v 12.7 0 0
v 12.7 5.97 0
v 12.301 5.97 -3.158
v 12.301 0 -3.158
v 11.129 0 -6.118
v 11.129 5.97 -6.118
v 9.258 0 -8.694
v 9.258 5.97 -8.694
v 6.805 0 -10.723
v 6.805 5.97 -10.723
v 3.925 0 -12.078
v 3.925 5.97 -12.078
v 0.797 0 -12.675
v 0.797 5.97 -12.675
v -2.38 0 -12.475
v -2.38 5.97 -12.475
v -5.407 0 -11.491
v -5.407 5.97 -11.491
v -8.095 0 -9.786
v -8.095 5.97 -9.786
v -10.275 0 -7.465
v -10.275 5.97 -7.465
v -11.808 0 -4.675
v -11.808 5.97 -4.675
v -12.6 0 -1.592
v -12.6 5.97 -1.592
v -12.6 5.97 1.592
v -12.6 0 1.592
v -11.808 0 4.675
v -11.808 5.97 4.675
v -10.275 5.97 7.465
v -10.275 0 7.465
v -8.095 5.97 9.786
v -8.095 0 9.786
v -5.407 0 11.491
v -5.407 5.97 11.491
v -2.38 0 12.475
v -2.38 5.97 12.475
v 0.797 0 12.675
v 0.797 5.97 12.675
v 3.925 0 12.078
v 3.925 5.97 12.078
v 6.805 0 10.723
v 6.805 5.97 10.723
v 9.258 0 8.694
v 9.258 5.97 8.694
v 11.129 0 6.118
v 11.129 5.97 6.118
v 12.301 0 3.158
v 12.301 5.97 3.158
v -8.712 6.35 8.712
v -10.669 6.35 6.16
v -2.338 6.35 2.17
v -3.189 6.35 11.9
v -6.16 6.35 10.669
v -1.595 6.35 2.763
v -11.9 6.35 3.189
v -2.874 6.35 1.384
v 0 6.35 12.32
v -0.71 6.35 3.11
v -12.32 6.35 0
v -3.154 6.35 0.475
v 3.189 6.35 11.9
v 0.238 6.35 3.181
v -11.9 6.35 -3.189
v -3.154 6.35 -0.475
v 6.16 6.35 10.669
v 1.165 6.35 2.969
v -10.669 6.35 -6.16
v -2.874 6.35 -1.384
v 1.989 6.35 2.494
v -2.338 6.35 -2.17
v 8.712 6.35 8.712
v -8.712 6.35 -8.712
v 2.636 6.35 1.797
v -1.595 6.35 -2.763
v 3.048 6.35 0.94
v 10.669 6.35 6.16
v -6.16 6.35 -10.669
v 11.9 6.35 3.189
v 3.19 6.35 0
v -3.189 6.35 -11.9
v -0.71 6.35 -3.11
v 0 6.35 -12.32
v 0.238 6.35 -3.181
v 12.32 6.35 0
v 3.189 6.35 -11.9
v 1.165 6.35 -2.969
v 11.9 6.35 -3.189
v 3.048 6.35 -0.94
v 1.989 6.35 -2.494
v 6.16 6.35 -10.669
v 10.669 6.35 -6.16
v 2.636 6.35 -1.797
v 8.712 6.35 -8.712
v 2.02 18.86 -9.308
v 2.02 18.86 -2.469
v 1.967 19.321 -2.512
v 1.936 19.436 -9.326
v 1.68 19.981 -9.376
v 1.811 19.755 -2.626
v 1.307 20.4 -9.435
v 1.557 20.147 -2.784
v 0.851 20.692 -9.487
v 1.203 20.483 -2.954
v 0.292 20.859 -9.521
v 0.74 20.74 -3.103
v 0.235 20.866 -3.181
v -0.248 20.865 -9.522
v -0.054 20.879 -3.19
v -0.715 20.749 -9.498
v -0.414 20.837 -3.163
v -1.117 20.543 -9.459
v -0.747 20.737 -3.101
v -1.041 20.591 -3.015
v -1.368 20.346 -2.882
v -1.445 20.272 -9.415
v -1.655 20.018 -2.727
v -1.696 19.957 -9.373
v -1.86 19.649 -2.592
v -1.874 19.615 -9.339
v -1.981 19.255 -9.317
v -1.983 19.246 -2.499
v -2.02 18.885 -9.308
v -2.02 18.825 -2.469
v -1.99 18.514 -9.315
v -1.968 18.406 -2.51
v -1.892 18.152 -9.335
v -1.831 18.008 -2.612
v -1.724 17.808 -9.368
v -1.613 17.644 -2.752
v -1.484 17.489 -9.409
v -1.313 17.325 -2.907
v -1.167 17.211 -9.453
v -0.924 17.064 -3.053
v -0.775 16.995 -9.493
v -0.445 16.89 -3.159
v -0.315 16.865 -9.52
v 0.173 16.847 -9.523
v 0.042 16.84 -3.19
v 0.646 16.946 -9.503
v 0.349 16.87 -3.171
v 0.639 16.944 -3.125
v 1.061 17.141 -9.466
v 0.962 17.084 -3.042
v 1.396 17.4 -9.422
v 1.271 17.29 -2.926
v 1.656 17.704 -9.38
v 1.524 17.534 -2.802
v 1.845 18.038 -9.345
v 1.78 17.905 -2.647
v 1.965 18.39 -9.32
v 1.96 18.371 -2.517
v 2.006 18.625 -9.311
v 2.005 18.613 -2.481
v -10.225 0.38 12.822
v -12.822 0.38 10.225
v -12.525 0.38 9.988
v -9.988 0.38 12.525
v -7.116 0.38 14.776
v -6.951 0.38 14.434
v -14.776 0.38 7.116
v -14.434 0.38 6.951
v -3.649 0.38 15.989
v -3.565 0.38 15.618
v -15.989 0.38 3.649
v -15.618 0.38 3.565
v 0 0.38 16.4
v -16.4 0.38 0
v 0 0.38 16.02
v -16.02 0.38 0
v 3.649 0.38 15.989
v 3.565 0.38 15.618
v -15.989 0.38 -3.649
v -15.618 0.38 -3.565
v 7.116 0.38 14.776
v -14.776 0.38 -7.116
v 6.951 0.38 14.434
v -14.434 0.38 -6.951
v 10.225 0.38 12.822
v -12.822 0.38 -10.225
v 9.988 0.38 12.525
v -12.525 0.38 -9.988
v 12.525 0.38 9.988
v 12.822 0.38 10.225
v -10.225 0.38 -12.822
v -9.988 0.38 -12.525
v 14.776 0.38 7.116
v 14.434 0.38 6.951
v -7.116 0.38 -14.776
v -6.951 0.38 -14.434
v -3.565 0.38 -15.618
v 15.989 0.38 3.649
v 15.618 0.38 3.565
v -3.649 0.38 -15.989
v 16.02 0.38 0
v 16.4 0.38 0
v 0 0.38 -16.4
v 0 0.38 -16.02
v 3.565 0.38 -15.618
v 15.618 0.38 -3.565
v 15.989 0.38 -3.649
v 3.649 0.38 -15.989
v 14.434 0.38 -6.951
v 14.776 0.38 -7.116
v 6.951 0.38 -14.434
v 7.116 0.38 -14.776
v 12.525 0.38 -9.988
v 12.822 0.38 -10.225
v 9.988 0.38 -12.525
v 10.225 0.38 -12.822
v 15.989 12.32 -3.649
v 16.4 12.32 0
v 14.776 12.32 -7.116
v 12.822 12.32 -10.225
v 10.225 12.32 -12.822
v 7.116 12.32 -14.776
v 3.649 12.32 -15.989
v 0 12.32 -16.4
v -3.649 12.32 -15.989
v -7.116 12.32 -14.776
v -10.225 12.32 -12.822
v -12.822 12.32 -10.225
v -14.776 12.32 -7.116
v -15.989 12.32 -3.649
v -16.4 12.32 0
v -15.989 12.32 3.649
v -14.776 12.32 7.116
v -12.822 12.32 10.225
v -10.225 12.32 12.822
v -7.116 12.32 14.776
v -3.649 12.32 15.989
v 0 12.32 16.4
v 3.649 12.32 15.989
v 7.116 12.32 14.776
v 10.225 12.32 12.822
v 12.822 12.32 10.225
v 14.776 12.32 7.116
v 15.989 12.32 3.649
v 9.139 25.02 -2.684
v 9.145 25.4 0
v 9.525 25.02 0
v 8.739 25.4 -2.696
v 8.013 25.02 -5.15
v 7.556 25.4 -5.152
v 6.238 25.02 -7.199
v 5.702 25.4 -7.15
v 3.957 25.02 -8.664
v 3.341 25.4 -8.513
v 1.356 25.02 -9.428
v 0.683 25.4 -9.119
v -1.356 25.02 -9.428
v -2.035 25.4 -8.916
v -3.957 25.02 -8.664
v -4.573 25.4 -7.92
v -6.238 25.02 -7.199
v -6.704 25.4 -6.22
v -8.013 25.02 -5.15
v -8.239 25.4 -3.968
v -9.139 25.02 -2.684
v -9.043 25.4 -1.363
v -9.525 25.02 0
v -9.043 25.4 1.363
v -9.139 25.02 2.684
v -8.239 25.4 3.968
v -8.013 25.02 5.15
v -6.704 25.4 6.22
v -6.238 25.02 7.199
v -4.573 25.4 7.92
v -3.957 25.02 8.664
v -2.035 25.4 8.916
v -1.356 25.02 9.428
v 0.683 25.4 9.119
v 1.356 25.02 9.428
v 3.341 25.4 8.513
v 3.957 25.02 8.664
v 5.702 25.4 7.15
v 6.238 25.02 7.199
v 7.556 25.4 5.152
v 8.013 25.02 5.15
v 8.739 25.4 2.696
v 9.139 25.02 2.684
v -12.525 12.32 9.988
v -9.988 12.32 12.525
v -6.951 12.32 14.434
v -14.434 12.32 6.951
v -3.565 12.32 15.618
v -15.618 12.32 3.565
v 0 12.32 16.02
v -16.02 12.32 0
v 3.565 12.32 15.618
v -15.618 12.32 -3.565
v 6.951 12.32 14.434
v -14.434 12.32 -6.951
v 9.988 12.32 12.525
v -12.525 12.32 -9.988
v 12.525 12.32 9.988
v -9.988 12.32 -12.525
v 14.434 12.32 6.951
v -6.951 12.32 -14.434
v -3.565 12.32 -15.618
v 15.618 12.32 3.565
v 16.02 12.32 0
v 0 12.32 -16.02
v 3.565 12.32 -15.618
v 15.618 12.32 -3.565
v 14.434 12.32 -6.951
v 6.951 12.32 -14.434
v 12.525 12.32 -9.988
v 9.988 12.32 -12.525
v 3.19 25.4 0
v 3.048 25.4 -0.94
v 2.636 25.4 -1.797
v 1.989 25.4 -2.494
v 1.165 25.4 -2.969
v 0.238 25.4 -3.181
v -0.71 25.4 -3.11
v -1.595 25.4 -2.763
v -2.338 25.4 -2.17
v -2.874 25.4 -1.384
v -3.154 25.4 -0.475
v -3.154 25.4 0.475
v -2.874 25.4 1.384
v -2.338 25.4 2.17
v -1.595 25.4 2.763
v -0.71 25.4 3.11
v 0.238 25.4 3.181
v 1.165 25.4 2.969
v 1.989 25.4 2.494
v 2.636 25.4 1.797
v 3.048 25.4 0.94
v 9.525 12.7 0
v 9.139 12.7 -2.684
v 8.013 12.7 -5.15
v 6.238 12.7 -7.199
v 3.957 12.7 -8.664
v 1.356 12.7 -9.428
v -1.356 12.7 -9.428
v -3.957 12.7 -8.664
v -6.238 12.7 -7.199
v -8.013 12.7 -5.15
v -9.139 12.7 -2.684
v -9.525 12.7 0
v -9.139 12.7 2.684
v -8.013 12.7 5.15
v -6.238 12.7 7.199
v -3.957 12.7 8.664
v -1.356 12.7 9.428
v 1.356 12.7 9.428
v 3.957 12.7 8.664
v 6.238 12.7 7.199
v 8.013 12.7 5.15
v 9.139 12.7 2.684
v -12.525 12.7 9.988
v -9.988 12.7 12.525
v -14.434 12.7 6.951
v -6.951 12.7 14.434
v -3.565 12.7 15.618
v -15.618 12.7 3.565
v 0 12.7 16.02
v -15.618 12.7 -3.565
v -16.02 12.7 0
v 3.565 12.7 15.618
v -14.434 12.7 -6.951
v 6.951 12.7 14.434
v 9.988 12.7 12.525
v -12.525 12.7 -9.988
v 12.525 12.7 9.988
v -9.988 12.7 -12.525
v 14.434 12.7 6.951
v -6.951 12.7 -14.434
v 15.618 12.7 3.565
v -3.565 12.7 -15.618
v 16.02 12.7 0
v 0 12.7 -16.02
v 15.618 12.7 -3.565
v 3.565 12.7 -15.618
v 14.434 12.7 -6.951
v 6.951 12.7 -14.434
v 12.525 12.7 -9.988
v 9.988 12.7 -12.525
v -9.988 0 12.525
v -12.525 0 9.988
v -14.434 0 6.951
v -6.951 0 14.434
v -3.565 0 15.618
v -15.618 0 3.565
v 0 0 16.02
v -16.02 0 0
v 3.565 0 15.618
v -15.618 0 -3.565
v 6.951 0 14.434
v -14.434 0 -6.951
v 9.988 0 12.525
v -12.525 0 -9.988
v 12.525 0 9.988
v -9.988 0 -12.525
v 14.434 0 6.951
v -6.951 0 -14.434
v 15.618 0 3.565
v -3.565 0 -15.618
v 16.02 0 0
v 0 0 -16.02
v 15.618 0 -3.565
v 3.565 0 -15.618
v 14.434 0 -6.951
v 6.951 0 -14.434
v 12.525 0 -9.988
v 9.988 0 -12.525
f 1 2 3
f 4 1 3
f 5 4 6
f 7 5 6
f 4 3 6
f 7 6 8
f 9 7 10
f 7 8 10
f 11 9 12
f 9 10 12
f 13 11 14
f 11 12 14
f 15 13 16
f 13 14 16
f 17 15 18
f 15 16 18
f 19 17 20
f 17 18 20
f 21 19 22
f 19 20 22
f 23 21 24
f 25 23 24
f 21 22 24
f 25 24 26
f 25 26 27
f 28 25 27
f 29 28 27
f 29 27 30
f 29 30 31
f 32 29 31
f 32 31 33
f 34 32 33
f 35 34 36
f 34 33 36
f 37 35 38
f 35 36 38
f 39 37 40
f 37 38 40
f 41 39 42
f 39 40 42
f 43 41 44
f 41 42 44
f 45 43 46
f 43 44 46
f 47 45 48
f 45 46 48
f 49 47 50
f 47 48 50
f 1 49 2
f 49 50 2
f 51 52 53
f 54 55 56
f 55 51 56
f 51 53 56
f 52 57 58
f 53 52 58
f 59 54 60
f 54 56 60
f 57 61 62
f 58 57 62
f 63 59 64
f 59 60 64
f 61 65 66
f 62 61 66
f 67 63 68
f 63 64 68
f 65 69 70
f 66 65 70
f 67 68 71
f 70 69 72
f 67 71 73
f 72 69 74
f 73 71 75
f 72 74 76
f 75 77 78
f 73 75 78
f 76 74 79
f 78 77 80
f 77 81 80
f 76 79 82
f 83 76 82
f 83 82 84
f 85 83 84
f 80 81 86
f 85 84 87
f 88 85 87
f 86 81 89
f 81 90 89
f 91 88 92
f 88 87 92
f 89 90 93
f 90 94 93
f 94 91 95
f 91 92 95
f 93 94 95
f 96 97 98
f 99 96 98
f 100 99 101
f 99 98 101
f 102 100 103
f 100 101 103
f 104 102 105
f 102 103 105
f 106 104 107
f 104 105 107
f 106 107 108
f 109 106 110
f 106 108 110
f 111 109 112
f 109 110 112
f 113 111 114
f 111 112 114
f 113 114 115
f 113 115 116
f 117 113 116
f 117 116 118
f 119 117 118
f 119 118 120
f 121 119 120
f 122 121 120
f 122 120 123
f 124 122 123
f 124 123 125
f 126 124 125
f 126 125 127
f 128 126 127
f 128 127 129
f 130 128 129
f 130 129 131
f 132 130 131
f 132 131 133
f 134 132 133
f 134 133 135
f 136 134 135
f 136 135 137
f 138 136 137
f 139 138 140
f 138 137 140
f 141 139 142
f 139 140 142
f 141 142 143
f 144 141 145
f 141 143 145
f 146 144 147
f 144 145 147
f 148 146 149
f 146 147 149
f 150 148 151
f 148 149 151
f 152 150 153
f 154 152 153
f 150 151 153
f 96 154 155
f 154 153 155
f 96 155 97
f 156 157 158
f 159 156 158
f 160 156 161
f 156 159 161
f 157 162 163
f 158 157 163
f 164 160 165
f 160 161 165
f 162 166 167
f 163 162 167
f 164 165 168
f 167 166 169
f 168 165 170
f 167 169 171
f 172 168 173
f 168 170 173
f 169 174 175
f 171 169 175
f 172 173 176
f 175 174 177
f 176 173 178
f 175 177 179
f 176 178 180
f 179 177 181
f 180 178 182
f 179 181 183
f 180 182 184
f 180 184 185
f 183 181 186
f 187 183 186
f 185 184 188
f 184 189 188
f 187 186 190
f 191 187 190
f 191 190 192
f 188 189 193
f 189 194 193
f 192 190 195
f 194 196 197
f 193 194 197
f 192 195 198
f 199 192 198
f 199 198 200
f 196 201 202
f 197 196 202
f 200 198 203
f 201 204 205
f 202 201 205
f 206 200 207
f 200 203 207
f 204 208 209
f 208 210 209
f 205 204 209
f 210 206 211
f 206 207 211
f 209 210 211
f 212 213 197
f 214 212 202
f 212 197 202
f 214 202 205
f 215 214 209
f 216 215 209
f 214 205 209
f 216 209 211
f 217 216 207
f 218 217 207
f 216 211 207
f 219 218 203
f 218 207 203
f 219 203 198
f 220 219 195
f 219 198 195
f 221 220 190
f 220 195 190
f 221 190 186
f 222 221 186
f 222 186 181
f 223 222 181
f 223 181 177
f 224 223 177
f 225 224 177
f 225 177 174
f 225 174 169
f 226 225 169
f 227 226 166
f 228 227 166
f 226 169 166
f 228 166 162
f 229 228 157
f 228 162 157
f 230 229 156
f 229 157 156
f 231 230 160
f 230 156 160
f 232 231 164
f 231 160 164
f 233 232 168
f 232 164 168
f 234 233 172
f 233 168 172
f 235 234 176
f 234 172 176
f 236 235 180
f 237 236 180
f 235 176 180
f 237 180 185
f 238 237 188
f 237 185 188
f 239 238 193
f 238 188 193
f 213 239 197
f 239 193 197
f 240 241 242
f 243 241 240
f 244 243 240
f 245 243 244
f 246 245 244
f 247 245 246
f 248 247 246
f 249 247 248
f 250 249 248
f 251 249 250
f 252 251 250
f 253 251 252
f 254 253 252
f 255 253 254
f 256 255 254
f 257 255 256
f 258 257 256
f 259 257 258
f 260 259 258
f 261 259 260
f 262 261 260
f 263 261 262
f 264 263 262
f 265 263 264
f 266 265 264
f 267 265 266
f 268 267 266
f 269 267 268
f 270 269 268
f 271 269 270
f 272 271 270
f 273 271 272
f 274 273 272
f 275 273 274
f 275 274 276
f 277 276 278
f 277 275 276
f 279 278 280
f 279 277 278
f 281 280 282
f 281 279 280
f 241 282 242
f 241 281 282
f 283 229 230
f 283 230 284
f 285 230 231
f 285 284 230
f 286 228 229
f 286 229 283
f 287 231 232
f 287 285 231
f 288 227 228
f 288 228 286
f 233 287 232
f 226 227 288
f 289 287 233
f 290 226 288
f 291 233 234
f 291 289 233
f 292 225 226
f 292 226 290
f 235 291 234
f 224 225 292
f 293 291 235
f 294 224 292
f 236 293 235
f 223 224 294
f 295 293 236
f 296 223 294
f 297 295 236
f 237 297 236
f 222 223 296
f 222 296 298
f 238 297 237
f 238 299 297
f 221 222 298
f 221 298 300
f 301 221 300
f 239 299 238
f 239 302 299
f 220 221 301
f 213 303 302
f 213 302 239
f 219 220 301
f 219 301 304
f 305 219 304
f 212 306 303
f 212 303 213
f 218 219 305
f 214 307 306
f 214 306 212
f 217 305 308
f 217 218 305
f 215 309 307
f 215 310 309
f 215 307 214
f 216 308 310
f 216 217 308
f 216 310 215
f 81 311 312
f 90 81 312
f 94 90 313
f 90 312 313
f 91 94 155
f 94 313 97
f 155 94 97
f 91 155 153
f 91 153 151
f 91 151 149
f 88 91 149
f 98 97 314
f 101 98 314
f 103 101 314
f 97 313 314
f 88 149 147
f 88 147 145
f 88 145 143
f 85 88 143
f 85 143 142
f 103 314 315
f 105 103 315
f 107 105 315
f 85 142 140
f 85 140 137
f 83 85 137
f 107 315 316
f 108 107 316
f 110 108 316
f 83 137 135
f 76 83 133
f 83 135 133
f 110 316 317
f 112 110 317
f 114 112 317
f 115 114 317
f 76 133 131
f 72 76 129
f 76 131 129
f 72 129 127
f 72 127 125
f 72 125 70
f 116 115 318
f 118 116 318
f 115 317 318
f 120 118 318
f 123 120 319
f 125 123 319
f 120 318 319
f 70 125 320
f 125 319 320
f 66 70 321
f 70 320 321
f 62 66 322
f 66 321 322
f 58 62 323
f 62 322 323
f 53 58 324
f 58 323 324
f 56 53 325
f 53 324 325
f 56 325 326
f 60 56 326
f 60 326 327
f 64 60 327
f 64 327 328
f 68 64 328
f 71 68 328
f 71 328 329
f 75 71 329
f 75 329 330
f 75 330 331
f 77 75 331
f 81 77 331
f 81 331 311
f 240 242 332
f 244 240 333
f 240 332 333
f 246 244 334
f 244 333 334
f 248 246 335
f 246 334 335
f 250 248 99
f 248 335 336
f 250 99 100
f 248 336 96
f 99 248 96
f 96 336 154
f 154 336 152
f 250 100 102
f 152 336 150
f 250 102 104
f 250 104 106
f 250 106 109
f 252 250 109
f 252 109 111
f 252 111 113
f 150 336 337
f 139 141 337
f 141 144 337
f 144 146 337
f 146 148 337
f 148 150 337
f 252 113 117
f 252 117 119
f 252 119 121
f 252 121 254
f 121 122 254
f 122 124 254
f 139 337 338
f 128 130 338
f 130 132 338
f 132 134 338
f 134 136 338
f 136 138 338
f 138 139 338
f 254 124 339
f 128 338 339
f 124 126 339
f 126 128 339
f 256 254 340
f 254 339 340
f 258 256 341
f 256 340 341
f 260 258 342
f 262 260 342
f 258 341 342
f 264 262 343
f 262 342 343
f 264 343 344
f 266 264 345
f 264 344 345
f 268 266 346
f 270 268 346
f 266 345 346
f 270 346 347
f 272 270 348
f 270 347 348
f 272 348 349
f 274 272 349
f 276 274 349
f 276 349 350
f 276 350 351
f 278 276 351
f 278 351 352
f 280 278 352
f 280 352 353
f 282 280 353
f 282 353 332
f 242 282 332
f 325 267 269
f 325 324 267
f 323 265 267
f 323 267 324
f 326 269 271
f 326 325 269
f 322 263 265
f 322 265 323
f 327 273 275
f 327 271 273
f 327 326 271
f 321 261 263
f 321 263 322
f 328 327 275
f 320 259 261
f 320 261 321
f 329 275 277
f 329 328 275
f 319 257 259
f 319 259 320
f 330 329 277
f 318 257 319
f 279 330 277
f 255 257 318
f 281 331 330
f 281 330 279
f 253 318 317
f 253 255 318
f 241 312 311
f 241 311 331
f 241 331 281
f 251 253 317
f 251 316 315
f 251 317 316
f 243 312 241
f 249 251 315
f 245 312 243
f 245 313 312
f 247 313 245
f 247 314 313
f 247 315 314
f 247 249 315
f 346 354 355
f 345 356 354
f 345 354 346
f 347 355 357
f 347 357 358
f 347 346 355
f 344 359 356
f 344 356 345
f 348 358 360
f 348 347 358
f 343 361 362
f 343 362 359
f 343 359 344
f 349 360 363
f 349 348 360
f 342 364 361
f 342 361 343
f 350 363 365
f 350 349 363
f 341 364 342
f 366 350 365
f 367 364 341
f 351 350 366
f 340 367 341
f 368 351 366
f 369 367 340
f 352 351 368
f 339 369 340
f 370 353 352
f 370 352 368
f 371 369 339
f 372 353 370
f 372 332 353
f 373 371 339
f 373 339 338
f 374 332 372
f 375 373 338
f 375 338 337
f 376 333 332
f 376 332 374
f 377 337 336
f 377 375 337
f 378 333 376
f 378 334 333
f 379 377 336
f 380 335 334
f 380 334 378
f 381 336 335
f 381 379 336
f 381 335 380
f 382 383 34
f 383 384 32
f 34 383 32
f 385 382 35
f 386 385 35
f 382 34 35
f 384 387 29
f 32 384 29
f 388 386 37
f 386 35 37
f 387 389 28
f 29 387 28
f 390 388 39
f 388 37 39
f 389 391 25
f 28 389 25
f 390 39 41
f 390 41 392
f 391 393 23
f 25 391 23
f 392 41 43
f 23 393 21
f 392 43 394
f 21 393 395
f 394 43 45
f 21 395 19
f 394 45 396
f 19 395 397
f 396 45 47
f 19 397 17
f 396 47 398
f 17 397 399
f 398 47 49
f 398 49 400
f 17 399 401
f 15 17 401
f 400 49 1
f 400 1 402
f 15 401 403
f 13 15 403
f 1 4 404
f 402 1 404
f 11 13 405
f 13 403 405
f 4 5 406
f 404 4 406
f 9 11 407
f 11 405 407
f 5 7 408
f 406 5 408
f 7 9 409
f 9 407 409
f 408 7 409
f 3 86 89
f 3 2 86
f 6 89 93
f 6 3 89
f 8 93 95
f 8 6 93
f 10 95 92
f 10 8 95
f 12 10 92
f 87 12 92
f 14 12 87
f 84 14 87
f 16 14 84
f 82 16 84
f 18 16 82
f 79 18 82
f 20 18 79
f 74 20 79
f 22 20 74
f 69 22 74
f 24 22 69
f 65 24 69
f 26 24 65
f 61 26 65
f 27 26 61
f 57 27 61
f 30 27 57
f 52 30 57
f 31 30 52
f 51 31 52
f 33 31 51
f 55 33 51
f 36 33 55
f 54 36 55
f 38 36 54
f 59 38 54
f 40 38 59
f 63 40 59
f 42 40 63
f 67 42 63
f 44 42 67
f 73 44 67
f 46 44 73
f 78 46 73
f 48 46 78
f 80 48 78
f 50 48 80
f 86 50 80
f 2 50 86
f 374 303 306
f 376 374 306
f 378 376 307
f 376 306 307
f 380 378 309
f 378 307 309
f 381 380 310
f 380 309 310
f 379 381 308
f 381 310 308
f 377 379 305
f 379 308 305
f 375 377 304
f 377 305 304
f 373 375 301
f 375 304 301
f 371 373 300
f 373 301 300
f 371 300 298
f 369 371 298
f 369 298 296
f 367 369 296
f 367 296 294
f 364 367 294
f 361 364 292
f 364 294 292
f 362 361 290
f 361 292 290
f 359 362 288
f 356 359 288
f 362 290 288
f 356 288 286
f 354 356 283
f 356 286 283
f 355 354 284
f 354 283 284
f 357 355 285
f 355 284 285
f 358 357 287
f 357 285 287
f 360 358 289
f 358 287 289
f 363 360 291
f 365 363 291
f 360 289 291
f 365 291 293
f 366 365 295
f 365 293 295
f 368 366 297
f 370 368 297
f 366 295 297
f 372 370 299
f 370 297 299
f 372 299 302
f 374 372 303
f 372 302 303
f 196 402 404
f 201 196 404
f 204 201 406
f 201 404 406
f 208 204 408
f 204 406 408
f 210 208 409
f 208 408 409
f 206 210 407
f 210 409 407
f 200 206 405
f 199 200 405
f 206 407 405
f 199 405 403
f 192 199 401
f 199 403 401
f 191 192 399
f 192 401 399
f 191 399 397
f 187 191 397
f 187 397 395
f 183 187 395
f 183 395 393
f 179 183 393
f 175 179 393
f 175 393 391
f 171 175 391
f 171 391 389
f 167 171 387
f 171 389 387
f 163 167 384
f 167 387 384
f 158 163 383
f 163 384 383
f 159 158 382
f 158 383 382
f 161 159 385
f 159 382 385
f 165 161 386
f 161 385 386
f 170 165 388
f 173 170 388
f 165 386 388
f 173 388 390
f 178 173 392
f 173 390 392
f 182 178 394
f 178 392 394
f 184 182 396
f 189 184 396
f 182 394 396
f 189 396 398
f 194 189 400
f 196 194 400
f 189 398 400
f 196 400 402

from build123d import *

# Parameters (mm, degrees)
SKETCH1_R           = 16.02
BOSS_EXTRUDE1_DEPTH = 0.38
SKETCH2_R           = 16.4
BOSS_EXTRUDE2_DEPTH = 11.94
SKETCH3_R           = 16.02
BOSS_EXTRUDE3_DEPTH = 0.38
SKETCH4_R           = 9.525
BOSS_EXTRUDE4_DEPTH = 12.32
SKETCH5_R           = 9.525
BOSS_EXTRUDE5_DEPTH = 0.38
BOSS_EXTRUDE5_TAPER = 45
SKETCH6_R           = 3.19
CUT_EXTRUDE1_DEPTH  = 19.05
SKETCH7_R           = 12.32
CUT_EXTRUDE5_DEPTH  = 0.38
CUT_EXTRUDE5_TAPER  = -45
SKETCH11_R          = 12.7
CUT_EXTRUDE6_DEPTH  = 5.97
SKETCH13_R          = 2.02
CUT_EXTRUDE7_DEPTH  = 10.97


with BuildPart() as part:
    # Sketch1 → Boss-Extrude1 (new body)
    with BuildSketch(Plane(origin=(0, 0, 0), x_dir=(1, 0, 0), z_dir=(0, 1, 0))):
        Circle(SKETCH1_R)
    extrude(amount=BOSS_EXTRUDE1_DEPTH)

    # Sketch2 → Boss-Extrude2 (add)
    with BuildSketch(Plane(origin=(0, 0.38, 0), x_dir=(1, 0, 0), z_dir=(0, 1, 0))):
        Circle(SKETCH2_R)
    extrude(amount=BOSS_EXTRUDE2_DEPTH)

    # Sketch3 → Boss-Extrude3 (add)
    with BuildSketch(Plane(origin=(0, 12.32, 0), x_dir=(1, 0, 0), z_dir=(0, 1, 0))):
        Circle(SKETCH3_R)
    extrude(amount=BOSS_EXTRUDE3_DEPTH)

    # Sketch4 → Boss-Extrude4 (add)
    with BuildSketch(Plane(origin=(0, 12.7, 0), x_dir=(1, 0, 0), z_dir=(0, 1, 0))):
        Circle(SKETCH4_R)
    extrude(amount=BOSS_EXTRUDE4_DEPTH)

    # Sketch5 → Boss-Extrude5 (add)
    with BuildSketch(Plane(origin=(0, 25.02, 0), x_dir=(1, 0, 0), z_dir=(0, 1, 0))):
        Circle(SKETCH5_R)
    extrude(amount=BOSS_EXTRUDE5_DEPTH, taper=BOSS_EXTRUDE5_TAPER)

    # Sketch6 → Cut-Extrude1 (cut)
    with BuildSketch(Plane(origin=(0, 25.4, 0), x_dir=(1, 0, 0), z_dir=(0, 1, 0))):
        Circle(SKETCH6_R)
    extrude(amount=-CUT_EXTRUDE1_DEPTH, mode=Mode.SUBTRACT)

    # Sketch7 → Cut-Extrude5 (cut)
    with BuildSketch(Plane(origin=(0, 6.35, 0), x_dir=(1, 0, 0), z_dir=(0, 1, 0))):
        Circle(SKETCH7_R)
    extrude(amount=-CUT_EXTRUDE5_DEPTH, taper=CUT_EXTRUDE5_TAPER, mode=Mode.SUBTRACT)

    # Sketch11 → Cut-Extrude6 (cut)
    with BuildSketch(Plane(origin=(0, 5.97, 0), x_dir=(1, 0, 0), z_dir=(0, 1, 0))):
        Circle(SKETCH11_R)
    extrude(amount=-CUT_EXTRUDE6_DEPTH, mode=Mode.SUBTRACT)

    # Sketch13 → Cut-Extrude7 (cut)
    with BuildSketch(Plane.XY):
        with Locations((0, 18.86)):
            Circle(SKETCH13_R)
    extrude(amount=-CUT_EXTRUDE7_DEPTH, mode=Mode.SUBTRACT)


solid = part.part
